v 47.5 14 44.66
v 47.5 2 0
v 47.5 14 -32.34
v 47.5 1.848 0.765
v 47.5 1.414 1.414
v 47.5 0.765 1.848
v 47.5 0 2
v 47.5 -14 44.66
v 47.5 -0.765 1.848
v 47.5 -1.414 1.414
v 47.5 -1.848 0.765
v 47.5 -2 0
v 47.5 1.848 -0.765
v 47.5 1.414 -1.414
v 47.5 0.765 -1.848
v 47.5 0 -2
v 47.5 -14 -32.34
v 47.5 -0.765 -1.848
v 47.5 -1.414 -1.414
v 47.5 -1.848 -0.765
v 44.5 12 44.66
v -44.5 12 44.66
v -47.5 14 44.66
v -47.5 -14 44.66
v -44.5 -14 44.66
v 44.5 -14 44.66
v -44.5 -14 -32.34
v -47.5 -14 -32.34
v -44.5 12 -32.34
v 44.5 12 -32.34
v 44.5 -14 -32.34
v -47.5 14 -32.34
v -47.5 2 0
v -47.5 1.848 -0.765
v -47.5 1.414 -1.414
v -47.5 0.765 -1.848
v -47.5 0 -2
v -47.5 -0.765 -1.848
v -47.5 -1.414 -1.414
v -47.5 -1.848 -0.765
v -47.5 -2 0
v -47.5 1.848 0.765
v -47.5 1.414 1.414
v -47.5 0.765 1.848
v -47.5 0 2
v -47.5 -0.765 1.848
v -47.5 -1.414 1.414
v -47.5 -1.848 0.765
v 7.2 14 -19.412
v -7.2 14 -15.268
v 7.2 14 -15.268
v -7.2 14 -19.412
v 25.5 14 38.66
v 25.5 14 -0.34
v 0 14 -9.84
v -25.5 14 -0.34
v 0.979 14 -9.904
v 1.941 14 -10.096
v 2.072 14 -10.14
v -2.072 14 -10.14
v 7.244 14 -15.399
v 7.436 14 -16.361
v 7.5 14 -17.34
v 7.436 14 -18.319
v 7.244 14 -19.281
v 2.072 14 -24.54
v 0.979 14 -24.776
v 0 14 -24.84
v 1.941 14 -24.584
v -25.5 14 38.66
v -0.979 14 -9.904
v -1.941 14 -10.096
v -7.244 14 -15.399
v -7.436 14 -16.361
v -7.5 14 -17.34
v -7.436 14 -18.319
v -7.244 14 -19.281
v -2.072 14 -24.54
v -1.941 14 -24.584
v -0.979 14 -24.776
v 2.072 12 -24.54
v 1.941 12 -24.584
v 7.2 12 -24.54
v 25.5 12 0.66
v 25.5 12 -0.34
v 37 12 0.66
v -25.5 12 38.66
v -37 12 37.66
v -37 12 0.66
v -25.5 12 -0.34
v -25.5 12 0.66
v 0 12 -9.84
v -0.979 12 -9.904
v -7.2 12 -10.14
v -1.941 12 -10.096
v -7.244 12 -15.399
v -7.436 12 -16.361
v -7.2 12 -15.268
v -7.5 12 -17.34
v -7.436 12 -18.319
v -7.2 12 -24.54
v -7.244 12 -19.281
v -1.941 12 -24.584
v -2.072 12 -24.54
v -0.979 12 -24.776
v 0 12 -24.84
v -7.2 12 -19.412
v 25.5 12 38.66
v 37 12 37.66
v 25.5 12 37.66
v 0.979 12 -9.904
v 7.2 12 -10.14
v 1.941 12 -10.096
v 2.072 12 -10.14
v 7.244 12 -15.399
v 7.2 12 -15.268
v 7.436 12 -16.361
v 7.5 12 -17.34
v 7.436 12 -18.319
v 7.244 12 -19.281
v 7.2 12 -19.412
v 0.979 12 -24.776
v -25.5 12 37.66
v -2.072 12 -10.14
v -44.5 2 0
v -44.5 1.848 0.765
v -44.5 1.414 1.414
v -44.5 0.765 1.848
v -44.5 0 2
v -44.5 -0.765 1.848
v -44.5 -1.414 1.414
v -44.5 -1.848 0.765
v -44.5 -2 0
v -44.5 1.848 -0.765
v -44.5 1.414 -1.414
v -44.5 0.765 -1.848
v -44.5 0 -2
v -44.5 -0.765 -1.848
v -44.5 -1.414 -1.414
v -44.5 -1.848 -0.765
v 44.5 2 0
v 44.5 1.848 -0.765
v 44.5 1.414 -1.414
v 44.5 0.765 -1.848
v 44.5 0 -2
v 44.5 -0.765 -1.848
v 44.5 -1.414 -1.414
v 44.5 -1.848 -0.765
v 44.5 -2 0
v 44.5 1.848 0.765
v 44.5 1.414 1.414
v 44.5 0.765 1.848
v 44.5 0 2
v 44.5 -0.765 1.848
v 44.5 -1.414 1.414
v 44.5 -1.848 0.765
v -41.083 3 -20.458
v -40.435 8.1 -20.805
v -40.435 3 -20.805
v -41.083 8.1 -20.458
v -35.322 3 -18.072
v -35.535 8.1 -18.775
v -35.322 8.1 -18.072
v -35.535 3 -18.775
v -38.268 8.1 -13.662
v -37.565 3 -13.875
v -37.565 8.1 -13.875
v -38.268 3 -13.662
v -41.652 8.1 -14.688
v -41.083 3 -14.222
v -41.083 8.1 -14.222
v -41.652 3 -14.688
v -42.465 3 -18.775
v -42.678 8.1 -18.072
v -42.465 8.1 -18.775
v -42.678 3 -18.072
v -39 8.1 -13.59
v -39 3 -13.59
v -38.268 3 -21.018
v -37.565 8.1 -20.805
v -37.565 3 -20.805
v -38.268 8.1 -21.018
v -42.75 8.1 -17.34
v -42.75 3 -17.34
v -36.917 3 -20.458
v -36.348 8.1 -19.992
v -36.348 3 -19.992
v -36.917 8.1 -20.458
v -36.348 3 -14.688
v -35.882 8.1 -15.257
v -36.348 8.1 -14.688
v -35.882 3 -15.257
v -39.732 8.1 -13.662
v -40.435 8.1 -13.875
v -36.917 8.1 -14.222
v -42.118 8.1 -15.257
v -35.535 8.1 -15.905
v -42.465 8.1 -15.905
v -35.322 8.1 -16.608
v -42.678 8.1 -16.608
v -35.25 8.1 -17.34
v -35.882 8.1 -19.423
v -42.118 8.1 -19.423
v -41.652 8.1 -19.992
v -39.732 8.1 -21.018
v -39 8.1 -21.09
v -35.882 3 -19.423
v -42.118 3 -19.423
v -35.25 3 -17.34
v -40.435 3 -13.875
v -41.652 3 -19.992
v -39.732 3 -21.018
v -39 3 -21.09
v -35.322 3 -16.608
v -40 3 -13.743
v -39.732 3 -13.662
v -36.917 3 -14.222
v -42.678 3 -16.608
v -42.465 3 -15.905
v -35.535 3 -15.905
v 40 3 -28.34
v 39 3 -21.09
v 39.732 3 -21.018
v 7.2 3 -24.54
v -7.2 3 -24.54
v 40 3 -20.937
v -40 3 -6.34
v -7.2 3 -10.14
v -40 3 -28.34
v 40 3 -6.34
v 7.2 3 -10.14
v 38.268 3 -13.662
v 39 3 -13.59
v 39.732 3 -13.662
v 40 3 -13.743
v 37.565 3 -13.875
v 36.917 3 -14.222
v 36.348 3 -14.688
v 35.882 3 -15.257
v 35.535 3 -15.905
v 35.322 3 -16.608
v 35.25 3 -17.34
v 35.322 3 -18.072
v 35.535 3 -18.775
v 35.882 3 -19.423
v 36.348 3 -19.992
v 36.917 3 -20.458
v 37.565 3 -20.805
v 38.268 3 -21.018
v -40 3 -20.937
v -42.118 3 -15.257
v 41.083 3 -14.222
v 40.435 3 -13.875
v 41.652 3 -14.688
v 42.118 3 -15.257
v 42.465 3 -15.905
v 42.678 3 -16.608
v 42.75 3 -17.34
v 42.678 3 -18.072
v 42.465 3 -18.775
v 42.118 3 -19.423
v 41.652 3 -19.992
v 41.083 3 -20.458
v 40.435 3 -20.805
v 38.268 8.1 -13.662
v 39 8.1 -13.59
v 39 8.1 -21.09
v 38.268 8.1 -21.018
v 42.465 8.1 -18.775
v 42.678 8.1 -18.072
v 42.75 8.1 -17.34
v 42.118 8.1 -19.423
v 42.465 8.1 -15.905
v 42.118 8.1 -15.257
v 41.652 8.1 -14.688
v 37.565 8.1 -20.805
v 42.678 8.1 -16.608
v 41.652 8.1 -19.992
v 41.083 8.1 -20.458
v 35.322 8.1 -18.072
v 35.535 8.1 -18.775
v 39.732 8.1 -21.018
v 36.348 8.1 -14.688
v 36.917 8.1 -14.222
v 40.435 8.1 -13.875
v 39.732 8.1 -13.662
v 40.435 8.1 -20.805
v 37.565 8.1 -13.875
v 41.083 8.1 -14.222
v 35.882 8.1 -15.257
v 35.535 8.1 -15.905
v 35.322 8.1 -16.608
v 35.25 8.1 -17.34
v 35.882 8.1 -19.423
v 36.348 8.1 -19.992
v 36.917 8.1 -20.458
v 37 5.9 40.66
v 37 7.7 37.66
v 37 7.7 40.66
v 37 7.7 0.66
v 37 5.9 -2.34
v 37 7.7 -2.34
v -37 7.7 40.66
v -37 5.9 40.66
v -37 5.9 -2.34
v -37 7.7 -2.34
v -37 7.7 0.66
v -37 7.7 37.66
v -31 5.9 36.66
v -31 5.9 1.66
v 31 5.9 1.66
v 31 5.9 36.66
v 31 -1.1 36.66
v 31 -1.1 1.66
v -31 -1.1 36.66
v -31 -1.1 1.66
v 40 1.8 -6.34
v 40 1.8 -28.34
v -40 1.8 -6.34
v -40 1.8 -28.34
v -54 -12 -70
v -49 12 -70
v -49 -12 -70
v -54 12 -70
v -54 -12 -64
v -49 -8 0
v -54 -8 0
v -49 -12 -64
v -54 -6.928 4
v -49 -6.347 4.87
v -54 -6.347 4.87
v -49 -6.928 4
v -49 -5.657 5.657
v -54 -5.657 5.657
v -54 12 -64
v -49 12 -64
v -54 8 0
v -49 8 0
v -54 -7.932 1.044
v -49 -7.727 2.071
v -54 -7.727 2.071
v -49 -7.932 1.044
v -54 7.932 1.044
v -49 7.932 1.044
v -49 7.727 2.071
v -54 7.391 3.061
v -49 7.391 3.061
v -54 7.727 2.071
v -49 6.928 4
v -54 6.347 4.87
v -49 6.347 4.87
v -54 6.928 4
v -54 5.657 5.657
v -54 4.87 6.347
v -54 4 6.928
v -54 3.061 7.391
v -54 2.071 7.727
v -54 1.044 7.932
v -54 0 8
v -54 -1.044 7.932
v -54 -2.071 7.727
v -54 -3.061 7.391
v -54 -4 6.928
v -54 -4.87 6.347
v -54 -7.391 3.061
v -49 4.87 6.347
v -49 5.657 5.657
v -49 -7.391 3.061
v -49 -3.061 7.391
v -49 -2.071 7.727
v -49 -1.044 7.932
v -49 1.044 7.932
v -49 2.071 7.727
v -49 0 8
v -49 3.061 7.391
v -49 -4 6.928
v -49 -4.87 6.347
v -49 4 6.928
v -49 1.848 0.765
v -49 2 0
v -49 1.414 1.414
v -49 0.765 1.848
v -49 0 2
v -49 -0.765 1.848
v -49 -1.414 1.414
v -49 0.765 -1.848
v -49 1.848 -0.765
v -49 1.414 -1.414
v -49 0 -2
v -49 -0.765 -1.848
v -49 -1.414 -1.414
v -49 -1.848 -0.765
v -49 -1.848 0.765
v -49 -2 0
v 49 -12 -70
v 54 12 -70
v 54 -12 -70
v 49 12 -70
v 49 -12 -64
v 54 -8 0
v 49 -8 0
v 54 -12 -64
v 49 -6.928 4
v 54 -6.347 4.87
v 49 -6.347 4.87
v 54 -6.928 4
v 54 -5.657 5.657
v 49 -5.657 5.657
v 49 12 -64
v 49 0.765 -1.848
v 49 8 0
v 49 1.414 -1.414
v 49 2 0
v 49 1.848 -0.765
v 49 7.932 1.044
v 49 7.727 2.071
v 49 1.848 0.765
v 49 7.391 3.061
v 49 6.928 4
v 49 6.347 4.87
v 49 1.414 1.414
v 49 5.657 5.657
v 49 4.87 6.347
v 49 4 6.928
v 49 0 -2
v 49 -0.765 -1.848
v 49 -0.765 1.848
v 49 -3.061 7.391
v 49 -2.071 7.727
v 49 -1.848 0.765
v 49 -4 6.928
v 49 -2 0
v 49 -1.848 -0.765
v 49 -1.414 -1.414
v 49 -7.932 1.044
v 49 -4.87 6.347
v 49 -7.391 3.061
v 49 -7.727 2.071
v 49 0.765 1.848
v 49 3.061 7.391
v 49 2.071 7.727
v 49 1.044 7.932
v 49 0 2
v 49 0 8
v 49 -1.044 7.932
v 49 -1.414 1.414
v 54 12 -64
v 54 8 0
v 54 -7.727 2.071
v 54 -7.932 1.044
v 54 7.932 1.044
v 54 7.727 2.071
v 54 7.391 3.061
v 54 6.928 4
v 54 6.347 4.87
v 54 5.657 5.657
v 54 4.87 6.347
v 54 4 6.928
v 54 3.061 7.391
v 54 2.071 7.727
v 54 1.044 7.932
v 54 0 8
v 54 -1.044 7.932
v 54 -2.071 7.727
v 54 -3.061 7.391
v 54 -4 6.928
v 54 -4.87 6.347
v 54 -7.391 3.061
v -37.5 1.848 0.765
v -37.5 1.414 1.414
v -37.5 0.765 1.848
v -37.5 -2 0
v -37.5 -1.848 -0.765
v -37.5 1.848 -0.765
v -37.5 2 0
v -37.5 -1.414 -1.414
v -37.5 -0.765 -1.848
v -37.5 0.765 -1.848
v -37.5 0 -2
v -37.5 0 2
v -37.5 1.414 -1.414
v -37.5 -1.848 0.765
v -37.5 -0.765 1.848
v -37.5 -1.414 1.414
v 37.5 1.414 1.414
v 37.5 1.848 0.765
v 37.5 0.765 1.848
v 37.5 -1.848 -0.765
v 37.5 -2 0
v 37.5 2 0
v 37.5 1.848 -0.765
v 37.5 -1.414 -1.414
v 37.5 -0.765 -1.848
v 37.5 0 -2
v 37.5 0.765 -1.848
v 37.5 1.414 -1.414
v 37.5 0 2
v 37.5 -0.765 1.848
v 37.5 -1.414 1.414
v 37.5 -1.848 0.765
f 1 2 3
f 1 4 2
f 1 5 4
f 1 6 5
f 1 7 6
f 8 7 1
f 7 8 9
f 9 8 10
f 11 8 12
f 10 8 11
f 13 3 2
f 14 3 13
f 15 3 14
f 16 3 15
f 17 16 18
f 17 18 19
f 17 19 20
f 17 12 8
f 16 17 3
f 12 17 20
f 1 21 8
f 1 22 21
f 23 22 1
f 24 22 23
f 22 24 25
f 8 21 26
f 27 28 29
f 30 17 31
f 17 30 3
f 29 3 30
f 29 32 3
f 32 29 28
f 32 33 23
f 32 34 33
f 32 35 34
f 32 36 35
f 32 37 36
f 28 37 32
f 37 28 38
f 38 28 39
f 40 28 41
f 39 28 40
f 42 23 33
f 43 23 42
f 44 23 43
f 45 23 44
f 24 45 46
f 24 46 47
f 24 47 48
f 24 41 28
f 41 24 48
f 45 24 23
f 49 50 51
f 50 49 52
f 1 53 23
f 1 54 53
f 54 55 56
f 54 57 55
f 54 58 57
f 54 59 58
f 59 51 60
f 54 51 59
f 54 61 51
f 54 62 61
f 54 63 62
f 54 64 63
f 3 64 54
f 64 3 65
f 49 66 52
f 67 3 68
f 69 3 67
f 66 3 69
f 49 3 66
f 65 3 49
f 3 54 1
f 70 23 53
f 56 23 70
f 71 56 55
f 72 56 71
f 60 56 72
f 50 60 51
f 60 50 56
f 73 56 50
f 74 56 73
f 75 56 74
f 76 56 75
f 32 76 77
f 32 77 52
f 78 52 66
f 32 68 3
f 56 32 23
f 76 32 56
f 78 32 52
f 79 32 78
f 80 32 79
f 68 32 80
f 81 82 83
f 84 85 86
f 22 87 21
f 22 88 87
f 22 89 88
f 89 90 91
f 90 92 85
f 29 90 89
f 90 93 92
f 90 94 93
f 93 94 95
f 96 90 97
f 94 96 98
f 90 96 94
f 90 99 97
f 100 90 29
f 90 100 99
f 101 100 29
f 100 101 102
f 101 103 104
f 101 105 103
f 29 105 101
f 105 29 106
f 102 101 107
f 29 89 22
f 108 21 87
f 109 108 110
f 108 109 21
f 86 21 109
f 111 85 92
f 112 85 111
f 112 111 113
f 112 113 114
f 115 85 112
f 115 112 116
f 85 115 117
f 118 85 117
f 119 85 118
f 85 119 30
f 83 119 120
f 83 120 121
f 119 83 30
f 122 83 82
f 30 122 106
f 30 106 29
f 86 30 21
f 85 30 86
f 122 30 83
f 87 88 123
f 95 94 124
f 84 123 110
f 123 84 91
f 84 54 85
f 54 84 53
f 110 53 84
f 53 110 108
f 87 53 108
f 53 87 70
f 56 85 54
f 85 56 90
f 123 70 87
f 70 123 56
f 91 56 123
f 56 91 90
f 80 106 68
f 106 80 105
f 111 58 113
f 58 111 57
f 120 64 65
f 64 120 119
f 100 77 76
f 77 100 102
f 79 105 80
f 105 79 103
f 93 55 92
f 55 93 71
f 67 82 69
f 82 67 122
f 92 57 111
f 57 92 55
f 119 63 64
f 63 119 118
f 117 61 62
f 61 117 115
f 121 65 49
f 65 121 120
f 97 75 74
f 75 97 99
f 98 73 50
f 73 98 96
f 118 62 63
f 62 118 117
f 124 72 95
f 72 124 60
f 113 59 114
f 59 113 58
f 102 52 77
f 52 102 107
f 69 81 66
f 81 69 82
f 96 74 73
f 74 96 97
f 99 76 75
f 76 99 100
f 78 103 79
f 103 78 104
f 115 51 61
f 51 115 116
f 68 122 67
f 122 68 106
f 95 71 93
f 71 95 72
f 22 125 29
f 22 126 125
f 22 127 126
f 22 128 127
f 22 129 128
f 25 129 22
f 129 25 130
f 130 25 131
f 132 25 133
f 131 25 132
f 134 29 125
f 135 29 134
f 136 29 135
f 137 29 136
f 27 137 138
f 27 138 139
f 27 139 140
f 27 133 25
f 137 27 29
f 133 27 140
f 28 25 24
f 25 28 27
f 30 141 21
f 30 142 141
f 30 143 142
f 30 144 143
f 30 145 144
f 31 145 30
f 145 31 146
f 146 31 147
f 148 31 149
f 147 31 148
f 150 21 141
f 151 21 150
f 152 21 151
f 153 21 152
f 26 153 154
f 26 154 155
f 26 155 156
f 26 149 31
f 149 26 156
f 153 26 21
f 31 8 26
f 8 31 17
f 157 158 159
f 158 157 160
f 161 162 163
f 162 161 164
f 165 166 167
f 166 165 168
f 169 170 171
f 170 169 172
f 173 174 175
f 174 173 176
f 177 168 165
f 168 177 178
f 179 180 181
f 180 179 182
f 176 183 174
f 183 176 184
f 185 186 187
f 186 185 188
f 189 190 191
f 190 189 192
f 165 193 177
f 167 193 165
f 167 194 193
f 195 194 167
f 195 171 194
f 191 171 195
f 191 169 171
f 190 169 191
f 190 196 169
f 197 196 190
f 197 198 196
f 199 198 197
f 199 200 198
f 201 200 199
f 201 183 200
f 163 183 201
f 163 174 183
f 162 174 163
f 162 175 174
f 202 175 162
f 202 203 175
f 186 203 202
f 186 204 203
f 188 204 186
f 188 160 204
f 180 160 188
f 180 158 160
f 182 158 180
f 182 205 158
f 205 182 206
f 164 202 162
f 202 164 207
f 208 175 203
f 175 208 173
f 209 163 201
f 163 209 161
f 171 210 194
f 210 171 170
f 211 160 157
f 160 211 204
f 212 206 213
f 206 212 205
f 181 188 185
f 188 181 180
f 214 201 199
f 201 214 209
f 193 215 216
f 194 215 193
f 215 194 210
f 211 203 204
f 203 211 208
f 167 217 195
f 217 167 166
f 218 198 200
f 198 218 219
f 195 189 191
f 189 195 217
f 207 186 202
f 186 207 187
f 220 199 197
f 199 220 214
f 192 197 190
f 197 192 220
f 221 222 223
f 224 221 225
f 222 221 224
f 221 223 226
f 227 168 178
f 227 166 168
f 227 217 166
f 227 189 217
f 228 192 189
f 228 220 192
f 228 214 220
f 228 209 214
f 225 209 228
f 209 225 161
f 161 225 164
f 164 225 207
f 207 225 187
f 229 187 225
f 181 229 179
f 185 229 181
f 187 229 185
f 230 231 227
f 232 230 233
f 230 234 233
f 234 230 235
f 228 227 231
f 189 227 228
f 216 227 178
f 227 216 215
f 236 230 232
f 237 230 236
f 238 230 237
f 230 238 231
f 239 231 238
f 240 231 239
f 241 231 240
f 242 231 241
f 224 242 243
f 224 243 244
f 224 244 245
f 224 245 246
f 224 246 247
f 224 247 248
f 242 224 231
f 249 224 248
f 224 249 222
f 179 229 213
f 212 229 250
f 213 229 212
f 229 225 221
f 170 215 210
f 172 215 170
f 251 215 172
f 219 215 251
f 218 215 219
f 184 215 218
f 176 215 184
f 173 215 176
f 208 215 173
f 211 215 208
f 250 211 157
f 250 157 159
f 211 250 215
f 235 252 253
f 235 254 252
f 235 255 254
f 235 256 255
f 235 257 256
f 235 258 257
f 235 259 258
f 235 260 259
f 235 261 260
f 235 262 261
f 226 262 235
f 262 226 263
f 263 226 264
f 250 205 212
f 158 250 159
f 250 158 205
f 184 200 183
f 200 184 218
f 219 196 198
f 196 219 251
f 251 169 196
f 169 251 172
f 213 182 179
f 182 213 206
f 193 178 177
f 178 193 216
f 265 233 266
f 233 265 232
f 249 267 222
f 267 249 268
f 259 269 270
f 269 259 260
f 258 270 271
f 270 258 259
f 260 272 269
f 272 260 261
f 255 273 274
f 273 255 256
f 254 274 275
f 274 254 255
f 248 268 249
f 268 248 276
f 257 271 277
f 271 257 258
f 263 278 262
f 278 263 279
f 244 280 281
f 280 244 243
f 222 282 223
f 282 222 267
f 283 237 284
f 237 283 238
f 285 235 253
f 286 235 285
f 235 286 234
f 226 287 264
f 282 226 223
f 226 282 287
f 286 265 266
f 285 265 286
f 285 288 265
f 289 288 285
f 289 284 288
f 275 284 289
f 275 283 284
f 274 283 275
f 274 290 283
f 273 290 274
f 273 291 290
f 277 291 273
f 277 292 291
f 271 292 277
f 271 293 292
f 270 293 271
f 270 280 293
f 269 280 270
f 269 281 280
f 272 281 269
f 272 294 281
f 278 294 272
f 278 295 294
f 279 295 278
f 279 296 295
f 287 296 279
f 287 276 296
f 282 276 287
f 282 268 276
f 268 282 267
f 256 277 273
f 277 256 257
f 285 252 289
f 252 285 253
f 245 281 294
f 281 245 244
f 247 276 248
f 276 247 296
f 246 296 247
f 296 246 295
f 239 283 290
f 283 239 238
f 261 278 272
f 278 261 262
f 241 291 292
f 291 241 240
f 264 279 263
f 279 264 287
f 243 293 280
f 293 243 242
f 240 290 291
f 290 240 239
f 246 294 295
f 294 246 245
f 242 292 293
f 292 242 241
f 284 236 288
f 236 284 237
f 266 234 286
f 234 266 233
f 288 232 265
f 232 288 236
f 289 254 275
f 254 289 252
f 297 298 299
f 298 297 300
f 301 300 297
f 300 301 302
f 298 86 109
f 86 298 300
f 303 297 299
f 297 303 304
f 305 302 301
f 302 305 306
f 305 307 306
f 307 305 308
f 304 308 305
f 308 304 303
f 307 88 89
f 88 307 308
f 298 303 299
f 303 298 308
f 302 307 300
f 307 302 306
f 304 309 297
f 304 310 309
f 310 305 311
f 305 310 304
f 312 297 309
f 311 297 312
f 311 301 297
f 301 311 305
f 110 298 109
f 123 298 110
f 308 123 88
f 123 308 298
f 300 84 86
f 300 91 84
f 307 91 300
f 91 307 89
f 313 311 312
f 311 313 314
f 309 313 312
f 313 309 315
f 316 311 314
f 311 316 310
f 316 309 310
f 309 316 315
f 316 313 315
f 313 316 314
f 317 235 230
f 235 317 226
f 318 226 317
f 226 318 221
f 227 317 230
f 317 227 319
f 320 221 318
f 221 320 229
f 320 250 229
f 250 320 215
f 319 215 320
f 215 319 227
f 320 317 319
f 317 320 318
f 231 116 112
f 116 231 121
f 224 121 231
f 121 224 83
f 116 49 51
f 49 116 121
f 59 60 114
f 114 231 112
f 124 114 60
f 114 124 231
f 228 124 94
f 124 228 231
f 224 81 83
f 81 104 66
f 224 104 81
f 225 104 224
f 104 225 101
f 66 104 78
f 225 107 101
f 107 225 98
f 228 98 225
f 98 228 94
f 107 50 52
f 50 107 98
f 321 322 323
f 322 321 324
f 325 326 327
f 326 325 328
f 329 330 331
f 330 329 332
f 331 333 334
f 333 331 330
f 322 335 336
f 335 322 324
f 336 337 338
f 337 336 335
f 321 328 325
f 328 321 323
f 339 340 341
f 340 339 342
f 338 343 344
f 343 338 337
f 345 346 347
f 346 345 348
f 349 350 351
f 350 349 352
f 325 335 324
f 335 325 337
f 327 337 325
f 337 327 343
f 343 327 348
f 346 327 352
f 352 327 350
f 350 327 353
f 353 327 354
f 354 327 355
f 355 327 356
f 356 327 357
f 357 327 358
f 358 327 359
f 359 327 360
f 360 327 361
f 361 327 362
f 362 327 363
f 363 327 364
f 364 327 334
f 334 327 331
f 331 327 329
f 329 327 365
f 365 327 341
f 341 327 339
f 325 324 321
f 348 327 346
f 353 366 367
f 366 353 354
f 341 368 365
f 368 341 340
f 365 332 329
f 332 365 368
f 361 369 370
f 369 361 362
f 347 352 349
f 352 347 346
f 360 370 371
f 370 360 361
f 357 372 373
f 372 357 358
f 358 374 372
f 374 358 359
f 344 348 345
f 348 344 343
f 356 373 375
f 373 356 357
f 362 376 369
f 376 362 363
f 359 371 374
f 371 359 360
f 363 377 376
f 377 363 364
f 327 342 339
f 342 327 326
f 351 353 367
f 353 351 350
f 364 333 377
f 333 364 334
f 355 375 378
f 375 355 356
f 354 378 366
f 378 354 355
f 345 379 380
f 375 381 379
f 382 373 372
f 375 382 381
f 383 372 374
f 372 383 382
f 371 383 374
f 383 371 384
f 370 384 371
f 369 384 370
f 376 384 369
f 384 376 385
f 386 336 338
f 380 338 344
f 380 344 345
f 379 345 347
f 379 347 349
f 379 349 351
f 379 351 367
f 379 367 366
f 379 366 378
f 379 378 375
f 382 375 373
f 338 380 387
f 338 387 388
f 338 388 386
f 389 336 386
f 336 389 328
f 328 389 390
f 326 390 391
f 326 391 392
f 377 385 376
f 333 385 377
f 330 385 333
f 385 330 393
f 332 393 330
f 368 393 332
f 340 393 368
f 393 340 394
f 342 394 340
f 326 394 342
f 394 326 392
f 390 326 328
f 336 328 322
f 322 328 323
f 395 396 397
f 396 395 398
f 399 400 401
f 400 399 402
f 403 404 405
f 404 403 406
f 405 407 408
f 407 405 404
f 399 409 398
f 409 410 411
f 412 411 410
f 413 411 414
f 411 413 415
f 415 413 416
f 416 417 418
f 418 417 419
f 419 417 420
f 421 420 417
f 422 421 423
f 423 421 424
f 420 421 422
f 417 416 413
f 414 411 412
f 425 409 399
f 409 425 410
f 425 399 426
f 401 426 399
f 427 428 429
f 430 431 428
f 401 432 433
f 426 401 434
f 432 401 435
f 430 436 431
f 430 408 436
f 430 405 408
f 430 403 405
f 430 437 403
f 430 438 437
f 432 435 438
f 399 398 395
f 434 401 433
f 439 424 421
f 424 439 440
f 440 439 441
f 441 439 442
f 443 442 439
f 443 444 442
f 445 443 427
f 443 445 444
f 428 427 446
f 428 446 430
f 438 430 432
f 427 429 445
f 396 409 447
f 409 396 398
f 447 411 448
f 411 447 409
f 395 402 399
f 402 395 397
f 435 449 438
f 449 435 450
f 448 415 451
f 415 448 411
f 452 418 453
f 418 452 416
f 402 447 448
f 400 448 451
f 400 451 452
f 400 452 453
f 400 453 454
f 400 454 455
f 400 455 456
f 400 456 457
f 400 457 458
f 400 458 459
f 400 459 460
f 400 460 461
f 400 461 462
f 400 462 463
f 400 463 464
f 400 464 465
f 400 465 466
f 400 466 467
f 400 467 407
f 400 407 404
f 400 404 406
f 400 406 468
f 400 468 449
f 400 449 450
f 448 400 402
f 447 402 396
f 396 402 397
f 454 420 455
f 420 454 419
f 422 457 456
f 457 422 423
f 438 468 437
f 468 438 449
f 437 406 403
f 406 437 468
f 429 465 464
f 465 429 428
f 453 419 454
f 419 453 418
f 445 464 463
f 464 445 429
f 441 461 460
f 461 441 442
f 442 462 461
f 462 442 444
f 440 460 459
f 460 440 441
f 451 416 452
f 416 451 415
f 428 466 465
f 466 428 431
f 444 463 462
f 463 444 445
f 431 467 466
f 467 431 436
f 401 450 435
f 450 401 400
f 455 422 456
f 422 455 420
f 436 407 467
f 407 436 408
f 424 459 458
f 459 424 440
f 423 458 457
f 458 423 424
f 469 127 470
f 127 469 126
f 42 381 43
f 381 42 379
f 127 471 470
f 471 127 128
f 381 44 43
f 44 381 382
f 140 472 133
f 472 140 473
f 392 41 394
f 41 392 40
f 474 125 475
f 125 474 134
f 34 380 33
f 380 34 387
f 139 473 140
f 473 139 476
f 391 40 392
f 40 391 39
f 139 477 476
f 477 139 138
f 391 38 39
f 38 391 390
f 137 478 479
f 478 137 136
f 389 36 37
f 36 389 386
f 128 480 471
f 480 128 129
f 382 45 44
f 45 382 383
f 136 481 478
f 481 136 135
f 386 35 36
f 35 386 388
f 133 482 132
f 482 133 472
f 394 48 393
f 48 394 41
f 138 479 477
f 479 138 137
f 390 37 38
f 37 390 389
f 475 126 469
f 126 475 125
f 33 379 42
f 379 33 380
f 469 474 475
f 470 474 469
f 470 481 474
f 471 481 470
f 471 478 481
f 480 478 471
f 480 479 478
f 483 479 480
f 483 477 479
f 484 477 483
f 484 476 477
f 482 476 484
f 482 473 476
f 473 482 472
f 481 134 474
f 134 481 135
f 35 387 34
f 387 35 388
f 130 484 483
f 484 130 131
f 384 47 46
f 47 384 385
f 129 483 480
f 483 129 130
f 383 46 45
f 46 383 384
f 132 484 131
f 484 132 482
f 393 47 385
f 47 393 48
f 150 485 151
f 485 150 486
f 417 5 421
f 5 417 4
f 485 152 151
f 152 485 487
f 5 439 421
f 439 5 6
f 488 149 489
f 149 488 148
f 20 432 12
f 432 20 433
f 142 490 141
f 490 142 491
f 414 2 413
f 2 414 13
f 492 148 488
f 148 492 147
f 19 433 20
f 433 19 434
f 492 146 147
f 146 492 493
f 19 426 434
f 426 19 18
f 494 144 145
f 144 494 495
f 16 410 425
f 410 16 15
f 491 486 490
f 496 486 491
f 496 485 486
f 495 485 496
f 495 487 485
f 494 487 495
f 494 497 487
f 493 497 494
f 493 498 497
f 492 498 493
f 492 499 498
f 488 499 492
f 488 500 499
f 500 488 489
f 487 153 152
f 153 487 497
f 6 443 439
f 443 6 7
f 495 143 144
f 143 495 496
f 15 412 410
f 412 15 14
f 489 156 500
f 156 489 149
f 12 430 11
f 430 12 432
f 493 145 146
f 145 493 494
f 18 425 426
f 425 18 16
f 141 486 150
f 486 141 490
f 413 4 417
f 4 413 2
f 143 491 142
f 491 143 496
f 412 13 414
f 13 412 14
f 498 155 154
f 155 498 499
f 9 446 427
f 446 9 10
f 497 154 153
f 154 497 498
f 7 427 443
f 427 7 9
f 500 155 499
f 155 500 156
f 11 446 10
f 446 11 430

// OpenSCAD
// Concept: the real head = a Guition ESP32-2432S024 (2.4" CYD) for the eyes + the bare C920 board below
// it, in a compact open frame on a yoke - the tilt axle through the head's middle so it's balanced.
// Proportions only (blocks), to agree the layout before the real parts.
//
// Frame: tilt axle along X at the origin, +Y forward, +Z up. tilt = head angle (deg, + = up).
include <../params.scad>

tilt = 0;

// ---- CYD ESP32-2432S024 (MEASURED 2026-10-21; landscape, USB-C at one end) -----------------------------
cyd_b     = [74, 43, 1.8];        // board: long (X), short (Z), thickness
cyd_holes = [68, 36];             // 4 x 3 mm holes, centres
cyd_glass = 4.3;                  // board front -> glass front
cyd_back  = 7;                    // EST: tallest back parts (JST, USB-C, ESP32 module) - TO MEASURE
cyd_act   = [49, 37];             // 2.4" 320x240 active area (nominal)
// ---- C920 bare board (MEASURED) -------------------------------------------------------------------------
cam_b     = [80, 22, 1.2];
cam_lens  = [14.4, 11];           // lens block side, height above the board
cam_mic   = [7.5, 5.1];

face_t    = 2;                    // front plate
gap       = 4;                    // between the screen's board and the camera board
margin    = 4;
head_w    = max(cyd_b[0], cam_b[0] + 7) + 2 * margin;            // mics overhang the camera board ~3.5
head_h    = cyd_b[1] + gap + cam_b[1] + 2 * margin;
y_face    = 14;                   // front face of the plate (forward of the axle)
z_bot     = -head_h * 0.42;       // axle about 42 % up from the bottom (the screen is the heavier part)

z_cam     = z_bot + margin;                         // camera board bottom
z_cyd     = z_cam + cam_b[1] + gap;                 // screen board bottom
y_cyd     = y_face - face_t - cyd_glass;            // screen board front (glass flush behind the plate)
y_cam     = y_face - cam_lens[1];                   // camera board front (lens ~flush with the face)

cheek_gap = 1.5;                  // washer
cheek_t   = 5;

module head() {
    // front plate with the two windows
    color("#d9d9d9") difference() {
        translate([-head_w / 2, y_face - face_t, z_bot]) cube([head_w, face_t, head_h]);
        translate([-cyd_act[0] / 2 - 1, y_face - 3, z_cyd + cyd_b[1] / 2 - cyd_act[1] / 2 - 1]) cube([cyd_act[0] + 2, 4, cyd_act[1] + 2]);
        translate([0, y_face - 3, z_cam + cam_b[1] / 2]) rotate([-90, 0, 0]) cylinder(d = 15, h = 4, $fn = 48);
    }
    // side frames (where the axle goes)
    color("#d9d9d9") for (s = [-1, 1]) translate([s > 0 ? head_w / 2 - 3 : -head_w / 2, -14, z_bot]) cube([3, y_face - face_t + 14, head_h]);
    // the screen
    color("#c98d1a") translate([-cyd_b[0] / 2, y_cyd - cyd_b[2], z_cyd]) cube([cyd_b[0], cyd_b[2], cyd_b[1]]);
    color("#111") translate([-cyd_b[0] / 2, y_cyd, z_cyd + 3]) cube([cyd_b[0], cyd_glass, cyd_b[1] - 6]);
    color("#777") translate([-cyd_b[0] / 2 + 6, y_cyd - cyd_b[2] - cyd_back, z_cyd + 4]) cube([cyd_b[0] - 12, cyd_back, cyd_b[1] - 8]);
    // the camera
    color("#2e7d32") translate([-cam_b[0] / 2, y_cam - cam_b[2], z_cam]) cube([cam_b[0], cam_b[2], cam_b[1]]);
    color("#111") translate([-cam_lens[0] / 2, y_cam, z_cam + cam_b[1] / 2 - cam_lens[0] / 2]) cube([cam_lens[0], cam_lens[1], cam_lens[0]]);
    color("#999") for (s = [-1, 1]) translate([s * (cam_b[0] / 2 - 1), y_cam, z_cam + cam_b[1] / 2]) rotate([-90, 0, 0])
        cylinder(d = cam_mic[0], h = cam_mic[1], $fn = 32);
}

module yoke() {   // the cheeks only, to show the width; the turret below is the test stand's, redrawn later
    color("#555") for (s = [-1, 1]) {
        x0 = s > 0 ? head_w / 2 + cheek_gap : -head_w / 2 - cheek_gap - cheek_t;
        hull() {
            translate([x0, 0, 0]) rotate([0, 90, 0]) cylinder(d = 16, h = cheek_t, $fn = 48);
            translate([x0, -12, -70]) cube([cheek_t, 24, 6]);
        }
    }
    color("#e8a33d") for (s = [-1, 1]) translate([s * (head_w / 2 - 4), 0, 0]) rotate([0, 90, 0]) cylinder(d = 4, h = 12, center = true, $fn = 16);
}

rotate([tilt, 0, 0]) head();
yoke();
echo(str("head ", head_w, " W x ", head_h, " H; yoke outside ", head_w + 2 * (cheek_gap + cheek_t), "; lens ",
         z_cam + cam_b[1] / 2, " / screen centre ", z_cyd + cyd_b[1] / 2, " from the axle"));
